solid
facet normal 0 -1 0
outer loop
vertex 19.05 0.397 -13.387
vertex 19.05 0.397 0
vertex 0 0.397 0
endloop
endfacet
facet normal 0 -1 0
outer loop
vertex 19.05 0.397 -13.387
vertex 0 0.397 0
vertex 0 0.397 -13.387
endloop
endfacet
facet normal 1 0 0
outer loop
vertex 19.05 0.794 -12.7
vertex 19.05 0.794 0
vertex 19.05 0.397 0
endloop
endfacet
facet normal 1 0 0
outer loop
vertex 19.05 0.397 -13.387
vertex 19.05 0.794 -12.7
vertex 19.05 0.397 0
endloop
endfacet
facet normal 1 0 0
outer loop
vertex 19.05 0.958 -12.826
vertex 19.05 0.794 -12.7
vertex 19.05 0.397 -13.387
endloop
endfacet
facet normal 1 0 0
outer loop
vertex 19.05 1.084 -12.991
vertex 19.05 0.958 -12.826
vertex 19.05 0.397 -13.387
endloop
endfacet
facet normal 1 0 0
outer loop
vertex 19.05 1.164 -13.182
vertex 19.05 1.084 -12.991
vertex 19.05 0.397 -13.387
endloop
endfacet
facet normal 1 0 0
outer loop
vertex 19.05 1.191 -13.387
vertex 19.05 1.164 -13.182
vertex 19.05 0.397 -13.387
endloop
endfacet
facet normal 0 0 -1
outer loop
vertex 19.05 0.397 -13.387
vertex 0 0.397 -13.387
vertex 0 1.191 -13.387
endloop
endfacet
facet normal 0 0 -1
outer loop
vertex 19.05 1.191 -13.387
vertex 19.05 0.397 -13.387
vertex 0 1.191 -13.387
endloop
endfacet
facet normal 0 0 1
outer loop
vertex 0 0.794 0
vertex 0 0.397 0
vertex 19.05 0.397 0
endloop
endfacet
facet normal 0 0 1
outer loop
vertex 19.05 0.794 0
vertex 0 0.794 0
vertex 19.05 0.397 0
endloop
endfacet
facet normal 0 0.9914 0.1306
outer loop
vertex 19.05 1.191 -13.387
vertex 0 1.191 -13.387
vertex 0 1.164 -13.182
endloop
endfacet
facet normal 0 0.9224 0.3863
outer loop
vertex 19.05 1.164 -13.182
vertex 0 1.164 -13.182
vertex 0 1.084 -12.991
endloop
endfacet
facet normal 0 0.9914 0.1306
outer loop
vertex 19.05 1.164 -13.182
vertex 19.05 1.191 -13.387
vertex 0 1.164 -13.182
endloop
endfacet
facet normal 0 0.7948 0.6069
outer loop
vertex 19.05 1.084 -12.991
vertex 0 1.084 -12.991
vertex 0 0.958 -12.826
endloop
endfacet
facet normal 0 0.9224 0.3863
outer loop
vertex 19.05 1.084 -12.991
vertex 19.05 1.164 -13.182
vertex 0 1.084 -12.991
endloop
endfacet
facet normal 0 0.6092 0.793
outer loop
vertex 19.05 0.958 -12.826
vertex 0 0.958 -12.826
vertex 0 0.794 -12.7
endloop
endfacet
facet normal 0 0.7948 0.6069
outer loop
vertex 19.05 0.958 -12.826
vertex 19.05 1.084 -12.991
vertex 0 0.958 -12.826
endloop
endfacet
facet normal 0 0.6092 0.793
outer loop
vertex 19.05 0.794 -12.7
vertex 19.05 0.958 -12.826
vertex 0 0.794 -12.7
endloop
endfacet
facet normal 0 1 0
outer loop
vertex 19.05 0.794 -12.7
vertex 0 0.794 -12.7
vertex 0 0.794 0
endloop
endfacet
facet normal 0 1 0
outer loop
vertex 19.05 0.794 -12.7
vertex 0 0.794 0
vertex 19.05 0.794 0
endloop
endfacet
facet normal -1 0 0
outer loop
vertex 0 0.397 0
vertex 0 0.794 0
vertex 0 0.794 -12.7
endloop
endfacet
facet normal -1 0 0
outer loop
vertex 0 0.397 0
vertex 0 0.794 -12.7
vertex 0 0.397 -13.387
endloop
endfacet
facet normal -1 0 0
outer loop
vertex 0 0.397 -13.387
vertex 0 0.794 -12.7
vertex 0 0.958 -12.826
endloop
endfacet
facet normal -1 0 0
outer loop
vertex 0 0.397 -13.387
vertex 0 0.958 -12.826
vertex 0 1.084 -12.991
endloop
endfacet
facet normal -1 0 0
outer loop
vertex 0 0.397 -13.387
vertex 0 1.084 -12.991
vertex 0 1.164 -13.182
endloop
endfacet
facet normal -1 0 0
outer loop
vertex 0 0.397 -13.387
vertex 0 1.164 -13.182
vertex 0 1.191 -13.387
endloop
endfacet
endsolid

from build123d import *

# Parameters (mm, degrees)
SKETCH1_W           = 19.05
SKETCH1_H           = 12.7
BOSS_EXTRUDE1_DEPTH = 0.79375
SKETCH2_R           = 0.79375
BOSS_EXTRUDE2_DEPTH = 19.05
CUT_EXTRUDE2_DEPTH  = 20.05


with BuildPart() as part:
    # Sketch1 → Boss-Extrude1 (new body)
    with BuildSketch(Plane(origin=(0, 0, 0), x_dir=(1, 0, 0), z_dir=(0, 1, 0))):
        with Locations((9.525, 6.35)):
            Rectangle(SKETCH1_W, SKETCH1_H)
    extrude(amount=BOSS_EXTRUDE1_DEPTH)

    # Sketch2 → Boss-Extrude2 (add)
    with BuildSketch(Plane(origin=(19.05, 0, 0), x_dir=(0, 0, -1), z_dir=(1, 0, 0))):
        with Locations((13.387407664, 0.396875)):
            Circle(SKETCH2_R)
    extrude(amount=-BOSS_EXTRUDE2_DEPTH)

    # Sketch4 → Cut-Extrude2 (cut, through all)
    with BuildSketch(Plane(origin=(19.05, 0, 0), x_dir=(0, 0, -1), z_dir=(1, 0, 0))):
        Polygon((0, 0.396875), (13.387407664, 0.396875), (13.387407664, 1.190625), (14.181157664, 1.190625), (14.181157664, -0.396875), (0, -0.396875), align=None)
    extrude(amount=-CUT_EXTRUDE2_DEPTH, mode=Mode.SUBTRACT)


solid = part.part
